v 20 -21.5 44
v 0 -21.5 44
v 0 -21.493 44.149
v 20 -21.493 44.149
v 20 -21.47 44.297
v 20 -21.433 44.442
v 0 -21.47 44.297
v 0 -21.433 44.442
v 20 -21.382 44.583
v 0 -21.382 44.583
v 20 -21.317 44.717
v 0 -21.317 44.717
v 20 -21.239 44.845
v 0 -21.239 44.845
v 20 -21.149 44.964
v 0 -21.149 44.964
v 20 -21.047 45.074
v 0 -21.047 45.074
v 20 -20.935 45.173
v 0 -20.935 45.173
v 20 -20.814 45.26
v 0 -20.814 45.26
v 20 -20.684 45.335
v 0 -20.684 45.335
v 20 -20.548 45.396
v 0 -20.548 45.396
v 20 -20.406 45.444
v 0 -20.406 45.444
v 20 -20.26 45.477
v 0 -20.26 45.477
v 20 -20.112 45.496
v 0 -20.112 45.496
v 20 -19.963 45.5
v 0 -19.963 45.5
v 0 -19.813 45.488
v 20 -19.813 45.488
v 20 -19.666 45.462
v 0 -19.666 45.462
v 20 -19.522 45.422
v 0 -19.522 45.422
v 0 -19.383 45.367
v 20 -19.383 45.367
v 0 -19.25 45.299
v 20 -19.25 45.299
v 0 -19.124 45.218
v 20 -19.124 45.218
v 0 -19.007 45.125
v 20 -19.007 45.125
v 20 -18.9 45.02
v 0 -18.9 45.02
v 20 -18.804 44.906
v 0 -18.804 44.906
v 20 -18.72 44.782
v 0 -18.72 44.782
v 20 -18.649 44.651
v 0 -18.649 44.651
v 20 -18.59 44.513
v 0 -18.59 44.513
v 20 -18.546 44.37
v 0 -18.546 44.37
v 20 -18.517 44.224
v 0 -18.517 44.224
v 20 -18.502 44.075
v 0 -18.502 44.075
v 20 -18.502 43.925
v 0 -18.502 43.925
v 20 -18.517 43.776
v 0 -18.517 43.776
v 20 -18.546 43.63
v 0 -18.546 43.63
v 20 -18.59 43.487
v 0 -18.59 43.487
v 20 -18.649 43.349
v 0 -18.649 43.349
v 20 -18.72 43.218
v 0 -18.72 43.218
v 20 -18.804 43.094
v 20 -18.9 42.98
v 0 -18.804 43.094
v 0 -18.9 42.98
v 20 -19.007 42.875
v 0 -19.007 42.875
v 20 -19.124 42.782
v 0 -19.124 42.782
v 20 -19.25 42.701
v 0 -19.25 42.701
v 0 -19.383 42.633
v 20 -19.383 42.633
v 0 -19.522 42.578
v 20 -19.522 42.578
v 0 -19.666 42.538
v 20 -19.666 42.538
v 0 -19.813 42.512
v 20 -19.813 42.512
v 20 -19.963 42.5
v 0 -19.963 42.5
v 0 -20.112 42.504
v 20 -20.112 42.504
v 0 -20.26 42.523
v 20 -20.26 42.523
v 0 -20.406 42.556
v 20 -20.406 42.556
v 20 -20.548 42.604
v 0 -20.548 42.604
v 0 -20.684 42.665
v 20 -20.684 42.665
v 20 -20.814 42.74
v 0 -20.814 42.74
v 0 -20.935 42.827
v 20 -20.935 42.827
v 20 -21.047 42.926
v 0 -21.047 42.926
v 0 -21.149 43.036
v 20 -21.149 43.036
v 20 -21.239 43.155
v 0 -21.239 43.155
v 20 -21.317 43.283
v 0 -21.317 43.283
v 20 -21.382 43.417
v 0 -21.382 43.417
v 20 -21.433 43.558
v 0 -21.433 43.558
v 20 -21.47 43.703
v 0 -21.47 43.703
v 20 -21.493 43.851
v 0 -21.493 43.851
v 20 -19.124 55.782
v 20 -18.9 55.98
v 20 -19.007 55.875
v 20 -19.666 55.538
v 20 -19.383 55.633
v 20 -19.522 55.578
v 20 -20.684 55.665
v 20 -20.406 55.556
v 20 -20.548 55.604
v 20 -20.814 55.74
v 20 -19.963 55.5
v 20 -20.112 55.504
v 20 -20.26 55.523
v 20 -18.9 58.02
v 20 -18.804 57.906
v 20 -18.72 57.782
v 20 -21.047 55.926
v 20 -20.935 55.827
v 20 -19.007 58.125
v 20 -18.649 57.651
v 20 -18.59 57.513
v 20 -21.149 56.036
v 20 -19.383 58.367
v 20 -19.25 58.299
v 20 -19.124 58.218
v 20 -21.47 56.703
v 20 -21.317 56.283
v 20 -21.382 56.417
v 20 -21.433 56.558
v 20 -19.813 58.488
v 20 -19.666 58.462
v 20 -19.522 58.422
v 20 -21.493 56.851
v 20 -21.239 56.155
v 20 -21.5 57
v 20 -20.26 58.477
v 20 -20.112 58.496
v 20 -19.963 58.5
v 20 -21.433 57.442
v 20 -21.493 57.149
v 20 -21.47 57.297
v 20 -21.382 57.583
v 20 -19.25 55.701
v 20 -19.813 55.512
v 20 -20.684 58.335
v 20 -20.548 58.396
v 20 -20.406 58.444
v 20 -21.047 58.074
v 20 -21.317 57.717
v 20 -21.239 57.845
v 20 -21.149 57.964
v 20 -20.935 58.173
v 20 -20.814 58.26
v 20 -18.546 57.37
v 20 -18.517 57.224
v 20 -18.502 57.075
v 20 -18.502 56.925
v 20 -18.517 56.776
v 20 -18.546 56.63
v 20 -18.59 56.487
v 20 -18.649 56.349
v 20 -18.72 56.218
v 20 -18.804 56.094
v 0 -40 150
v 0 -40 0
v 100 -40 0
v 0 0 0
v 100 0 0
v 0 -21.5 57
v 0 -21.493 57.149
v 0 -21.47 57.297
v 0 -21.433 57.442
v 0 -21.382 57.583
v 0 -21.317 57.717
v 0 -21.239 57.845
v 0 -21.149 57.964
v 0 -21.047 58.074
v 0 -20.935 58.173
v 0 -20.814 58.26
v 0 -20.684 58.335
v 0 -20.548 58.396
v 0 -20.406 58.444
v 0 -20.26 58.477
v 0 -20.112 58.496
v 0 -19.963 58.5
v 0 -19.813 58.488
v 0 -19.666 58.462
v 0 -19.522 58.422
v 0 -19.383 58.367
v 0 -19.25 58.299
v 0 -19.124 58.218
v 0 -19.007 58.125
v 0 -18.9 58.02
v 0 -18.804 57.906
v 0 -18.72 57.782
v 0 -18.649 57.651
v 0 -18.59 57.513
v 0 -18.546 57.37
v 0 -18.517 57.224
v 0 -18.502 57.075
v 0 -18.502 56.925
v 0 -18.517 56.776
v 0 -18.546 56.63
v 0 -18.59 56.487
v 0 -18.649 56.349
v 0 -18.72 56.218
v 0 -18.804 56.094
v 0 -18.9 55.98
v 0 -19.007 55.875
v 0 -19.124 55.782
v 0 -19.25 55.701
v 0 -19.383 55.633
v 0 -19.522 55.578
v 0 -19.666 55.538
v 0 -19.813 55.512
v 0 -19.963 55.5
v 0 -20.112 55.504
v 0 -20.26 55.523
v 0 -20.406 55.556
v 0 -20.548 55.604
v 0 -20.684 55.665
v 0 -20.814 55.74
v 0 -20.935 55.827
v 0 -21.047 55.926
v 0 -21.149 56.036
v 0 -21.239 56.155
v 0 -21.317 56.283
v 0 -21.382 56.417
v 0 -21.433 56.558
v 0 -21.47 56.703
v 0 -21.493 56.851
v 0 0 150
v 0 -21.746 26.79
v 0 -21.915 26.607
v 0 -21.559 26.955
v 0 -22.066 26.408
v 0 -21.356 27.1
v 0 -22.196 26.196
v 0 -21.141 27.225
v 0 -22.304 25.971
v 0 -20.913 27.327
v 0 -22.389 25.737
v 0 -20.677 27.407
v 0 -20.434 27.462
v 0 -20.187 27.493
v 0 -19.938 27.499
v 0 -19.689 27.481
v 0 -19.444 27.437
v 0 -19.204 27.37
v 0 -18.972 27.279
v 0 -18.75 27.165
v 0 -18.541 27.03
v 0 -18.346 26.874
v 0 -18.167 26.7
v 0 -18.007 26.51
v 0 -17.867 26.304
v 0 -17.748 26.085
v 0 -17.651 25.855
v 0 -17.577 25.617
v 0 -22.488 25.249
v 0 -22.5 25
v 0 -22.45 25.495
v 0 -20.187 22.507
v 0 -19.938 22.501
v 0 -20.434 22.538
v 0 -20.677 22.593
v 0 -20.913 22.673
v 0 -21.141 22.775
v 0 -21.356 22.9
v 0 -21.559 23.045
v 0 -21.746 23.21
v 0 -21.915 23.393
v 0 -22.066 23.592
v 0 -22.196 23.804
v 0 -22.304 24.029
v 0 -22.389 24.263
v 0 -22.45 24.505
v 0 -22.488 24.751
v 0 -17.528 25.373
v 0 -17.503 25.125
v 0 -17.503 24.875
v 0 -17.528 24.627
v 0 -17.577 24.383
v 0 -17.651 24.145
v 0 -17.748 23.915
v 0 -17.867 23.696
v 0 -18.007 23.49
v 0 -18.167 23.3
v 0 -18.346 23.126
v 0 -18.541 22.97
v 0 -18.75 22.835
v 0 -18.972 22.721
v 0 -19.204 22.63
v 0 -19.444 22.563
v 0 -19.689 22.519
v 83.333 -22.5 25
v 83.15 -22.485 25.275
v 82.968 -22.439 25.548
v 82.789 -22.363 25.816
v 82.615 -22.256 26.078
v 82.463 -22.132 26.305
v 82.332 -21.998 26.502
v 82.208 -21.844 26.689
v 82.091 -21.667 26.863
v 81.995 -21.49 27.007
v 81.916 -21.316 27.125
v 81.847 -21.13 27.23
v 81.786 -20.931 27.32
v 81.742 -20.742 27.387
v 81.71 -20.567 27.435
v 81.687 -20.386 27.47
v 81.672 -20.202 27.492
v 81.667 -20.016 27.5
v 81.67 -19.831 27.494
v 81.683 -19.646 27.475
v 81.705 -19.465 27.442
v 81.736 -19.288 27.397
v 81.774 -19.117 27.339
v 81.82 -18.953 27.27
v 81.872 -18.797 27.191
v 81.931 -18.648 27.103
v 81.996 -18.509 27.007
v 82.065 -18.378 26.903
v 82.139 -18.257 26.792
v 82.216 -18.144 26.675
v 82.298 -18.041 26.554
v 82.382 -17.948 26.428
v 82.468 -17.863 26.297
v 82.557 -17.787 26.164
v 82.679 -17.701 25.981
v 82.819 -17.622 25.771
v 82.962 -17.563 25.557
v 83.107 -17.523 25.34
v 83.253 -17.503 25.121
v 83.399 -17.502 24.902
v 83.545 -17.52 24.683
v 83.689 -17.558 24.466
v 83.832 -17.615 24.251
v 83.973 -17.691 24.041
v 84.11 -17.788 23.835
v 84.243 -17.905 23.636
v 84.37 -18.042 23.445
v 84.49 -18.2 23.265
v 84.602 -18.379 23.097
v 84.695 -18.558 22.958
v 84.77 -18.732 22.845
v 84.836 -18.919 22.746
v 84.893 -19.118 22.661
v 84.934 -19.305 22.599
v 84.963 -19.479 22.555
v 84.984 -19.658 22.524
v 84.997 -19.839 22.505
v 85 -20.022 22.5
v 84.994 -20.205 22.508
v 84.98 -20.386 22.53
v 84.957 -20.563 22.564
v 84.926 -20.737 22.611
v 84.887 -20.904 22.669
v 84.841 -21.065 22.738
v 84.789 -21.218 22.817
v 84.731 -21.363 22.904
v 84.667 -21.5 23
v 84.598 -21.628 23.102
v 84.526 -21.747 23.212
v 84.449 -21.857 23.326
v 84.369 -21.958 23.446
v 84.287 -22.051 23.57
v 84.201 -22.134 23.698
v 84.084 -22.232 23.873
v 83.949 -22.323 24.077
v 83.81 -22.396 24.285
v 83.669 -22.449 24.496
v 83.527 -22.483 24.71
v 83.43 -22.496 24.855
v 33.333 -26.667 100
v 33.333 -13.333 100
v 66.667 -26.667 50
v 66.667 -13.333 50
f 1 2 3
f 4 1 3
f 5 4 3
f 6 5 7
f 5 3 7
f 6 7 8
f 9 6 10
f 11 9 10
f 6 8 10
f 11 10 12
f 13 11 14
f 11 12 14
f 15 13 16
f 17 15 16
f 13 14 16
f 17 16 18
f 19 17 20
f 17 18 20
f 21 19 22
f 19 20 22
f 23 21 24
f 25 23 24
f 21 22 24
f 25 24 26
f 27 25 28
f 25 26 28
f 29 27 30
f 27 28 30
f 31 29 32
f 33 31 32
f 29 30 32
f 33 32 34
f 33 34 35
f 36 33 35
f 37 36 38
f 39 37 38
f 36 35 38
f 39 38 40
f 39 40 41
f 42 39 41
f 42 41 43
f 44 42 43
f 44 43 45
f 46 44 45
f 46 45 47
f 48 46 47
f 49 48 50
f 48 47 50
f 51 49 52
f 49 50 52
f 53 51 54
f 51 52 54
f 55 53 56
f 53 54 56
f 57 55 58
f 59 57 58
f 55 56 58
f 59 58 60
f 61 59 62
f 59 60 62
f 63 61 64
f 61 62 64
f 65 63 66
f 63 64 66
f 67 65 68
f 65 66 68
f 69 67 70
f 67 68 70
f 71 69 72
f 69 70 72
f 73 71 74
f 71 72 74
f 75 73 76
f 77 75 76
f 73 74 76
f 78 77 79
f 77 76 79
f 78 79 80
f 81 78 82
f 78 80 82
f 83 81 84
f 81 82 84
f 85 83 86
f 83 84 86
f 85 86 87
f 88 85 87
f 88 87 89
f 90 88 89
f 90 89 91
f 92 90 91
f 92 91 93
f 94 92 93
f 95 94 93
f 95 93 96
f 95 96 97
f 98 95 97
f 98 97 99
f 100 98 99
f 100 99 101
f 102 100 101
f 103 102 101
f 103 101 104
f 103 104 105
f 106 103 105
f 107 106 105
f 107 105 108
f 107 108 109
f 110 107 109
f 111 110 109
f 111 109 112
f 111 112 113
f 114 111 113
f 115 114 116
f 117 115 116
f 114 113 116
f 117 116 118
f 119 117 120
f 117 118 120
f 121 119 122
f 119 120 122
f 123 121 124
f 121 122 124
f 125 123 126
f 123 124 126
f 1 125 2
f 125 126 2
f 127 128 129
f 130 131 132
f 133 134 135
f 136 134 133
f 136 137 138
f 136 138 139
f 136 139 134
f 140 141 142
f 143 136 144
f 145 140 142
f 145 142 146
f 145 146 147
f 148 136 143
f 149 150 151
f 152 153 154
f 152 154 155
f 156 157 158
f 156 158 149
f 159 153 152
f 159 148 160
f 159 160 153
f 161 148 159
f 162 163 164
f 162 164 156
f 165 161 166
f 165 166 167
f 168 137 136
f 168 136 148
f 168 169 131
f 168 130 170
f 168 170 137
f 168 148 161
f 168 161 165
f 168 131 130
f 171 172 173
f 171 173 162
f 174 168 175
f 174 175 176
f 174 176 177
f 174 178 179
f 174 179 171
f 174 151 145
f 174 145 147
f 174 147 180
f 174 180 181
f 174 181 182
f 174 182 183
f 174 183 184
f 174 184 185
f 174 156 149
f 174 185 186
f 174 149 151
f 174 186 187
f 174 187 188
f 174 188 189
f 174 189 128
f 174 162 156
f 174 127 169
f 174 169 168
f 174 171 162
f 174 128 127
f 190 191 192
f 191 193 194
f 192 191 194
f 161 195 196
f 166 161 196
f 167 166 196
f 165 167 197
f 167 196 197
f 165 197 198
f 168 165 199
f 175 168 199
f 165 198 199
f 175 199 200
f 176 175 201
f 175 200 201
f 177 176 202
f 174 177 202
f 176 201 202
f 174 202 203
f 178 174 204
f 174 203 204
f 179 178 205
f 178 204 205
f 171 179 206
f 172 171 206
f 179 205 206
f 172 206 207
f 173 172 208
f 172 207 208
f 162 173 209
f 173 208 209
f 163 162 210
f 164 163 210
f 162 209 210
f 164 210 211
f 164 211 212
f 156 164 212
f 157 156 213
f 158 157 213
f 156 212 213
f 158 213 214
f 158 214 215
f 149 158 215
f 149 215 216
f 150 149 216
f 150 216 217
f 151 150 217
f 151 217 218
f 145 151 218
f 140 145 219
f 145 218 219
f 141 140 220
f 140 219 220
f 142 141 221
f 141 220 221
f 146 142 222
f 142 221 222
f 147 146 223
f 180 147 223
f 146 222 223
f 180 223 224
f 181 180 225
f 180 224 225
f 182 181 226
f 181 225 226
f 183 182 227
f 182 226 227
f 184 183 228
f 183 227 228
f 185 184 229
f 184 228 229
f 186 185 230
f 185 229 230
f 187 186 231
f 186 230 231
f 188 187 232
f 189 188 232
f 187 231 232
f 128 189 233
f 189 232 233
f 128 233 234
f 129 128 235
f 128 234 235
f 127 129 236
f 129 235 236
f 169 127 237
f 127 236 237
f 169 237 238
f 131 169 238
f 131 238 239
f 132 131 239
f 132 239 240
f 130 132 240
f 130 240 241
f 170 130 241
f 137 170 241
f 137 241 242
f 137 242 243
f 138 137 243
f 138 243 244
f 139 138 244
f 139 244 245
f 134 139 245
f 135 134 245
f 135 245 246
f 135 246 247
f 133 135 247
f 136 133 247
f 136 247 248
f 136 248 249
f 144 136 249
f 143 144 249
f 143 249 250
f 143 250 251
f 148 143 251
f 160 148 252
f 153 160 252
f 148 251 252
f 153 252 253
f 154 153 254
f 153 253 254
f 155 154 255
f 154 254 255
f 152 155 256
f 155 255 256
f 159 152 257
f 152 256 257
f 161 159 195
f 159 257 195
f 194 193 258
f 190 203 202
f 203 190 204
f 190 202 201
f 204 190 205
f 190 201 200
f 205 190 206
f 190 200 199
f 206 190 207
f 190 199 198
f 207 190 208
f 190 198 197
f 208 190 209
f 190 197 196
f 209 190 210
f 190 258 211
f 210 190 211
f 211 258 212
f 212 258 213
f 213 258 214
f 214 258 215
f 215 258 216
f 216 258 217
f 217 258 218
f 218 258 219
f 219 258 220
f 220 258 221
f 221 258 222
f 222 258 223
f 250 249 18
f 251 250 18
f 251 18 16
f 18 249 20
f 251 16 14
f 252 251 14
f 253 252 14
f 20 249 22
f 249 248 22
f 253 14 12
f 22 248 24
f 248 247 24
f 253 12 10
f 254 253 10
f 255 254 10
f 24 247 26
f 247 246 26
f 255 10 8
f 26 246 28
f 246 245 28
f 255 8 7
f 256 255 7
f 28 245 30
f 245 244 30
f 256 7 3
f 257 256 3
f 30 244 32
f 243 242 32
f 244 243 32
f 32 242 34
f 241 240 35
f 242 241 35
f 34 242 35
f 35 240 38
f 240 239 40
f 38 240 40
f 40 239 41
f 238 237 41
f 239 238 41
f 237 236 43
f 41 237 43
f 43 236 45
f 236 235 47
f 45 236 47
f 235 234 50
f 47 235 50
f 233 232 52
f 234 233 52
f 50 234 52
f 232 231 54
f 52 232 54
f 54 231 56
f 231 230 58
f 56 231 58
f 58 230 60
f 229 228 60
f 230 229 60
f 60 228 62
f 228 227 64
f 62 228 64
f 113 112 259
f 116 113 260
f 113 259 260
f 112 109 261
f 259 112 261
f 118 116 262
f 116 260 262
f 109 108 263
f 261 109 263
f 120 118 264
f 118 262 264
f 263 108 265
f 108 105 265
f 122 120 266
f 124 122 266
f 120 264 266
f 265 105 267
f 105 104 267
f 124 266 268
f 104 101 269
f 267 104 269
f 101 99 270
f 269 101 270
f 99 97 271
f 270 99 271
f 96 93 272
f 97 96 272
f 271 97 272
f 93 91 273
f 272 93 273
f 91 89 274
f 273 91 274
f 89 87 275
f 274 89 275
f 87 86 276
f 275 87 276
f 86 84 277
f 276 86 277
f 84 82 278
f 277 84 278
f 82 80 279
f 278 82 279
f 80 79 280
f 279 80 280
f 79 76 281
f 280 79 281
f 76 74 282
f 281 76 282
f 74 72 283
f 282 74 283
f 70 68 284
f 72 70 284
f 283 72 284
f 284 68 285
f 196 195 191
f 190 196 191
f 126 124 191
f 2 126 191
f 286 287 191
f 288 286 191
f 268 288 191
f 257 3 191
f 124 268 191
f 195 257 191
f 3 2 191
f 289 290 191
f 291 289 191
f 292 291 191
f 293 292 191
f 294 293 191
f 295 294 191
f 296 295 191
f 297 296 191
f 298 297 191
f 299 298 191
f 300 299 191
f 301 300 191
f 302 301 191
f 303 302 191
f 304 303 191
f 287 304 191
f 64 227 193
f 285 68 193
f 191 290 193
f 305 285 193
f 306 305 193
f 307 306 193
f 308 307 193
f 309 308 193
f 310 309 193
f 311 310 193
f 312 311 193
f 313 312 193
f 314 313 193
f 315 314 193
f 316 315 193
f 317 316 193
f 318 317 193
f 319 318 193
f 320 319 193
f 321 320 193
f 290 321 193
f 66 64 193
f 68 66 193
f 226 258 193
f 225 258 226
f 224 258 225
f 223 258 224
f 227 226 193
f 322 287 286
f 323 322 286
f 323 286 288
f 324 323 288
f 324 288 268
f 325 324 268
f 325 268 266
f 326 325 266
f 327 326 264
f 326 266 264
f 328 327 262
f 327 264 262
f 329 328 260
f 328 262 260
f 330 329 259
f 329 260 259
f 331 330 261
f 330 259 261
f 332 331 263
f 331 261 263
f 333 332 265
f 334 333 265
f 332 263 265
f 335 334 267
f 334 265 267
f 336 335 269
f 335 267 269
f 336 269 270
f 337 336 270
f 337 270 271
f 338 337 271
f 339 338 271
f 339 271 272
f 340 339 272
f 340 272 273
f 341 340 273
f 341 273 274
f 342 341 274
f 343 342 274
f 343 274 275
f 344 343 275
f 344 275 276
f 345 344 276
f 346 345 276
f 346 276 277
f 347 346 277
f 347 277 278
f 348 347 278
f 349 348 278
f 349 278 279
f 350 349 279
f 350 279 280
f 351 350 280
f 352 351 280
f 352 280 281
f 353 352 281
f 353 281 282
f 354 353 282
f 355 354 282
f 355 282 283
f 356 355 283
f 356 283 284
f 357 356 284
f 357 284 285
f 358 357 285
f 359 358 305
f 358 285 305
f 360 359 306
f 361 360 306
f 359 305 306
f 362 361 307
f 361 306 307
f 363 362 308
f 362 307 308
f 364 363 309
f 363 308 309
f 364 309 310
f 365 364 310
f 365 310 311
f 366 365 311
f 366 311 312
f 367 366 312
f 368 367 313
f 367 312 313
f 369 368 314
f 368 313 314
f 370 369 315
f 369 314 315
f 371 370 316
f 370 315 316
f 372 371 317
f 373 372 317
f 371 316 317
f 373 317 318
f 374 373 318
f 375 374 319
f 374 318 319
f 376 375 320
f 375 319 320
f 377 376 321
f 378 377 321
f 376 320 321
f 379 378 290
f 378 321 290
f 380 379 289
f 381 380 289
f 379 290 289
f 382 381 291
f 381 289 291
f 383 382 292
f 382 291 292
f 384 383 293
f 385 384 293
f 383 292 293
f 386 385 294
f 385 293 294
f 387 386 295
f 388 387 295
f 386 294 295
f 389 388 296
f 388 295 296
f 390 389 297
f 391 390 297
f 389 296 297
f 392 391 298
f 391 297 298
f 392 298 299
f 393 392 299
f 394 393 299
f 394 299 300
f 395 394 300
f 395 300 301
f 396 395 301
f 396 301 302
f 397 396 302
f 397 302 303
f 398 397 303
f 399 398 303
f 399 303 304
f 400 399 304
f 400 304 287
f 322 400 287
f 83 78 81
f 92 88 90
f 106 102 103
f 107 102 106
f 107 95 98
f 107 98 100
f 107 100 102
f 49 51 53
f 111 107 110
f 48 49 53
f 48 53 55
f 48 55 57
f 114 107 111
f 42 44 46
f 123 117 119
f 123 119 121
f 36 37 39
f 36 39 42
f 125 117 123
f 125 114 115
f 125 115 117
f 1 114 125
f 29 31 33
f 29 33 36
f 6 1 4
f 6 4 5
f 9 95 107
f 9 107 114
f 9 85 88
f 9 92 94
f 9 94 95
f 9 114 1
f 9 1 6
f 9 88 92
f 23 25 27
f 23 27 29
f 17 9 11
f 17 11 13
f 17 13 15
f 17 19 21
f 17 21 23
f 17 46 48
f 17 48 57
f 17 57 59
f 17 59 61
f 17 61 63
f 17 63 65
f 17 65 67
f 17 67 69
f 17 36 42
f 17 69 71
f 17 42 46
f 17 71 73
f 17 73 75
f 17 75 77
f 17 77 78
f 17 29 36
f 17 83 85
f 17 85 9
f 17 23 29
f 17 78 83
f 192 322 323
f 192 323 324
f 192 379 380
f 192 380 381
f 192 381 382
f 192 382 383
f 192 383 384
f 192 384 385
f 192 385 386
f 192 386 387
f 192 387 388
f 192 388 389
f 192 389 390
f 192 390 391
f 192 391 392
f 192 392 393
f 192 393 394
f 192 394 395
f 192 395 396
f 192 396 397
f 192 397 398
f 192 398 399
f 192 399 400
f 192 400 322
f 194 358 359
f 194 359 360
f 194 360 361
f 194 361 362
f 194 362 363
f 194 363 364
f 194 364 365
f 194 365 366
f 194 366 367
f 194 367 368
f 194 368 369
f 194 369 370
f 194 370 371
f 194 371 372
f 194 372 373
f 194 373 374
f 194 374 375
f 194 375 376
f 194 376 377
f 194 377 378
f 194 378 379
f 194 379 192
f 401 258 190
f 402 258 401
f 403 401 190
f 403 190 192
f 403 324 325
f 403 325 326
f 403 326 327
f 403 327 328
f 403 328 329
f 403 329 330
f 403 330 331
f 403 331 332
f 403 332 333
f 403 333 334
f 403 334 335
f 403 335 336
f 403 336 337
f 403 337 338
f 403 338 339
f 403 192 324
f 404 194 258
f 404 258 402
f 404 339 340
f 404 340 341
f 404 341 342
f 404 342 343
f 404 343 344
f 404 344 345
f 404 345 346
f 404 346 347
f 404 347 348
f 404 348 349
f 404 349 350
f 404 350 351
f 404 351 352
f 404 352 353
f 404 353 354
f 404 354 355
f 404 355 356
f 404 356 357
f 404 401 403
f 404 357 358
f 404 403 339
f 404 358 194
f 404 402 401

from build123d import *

# Parameters (mm, degrees)
F1_DEPTH = 40
F2_R     = 2.5
F3_DEPTH = 100.001
F4_R     = 1.5
F5_DEPTH = 20


with BuildPart() as f1:
    # F0 (on Front) → F1 (new body)
    with BuildSketch(Plane.XZ):
        with BuildLine():
            Line((0, 150), (0, 0))
            Line((0, 0), (100, 0))
            add(Edge.make_bspline(
                [(0, 150), (33.333333, 100), (66.666667, 50), (100, 0)],
                knots=[0, 0, 0, 0, 180.277564, 180.277564, 180.277564, 180.277564], degree=3))
        make_face()
    extrude(amount=F1_DEPTH)

    # F2 (on face) → F3 (cut, through all)
    with BuildSketch(Plane(origin=(0, 0, 0), x_dir=(0, -1, 0), z_dir=(-1, 0, 0))):
        with Locations((20, 25)):
            Circle(F2_R)
    extrude(amount=-F3_DEPTH, mode=Mode.SUBTRACT)

    # F4 (on face) → F5 (cut)
    with BuildSketch(Plane(origin=(0, 0, 0), x_dir=(0, -1, 0), z_dir=(-1, 0, 0))):
        with Locations((20, 57)):
            Circle(F4_R)
        with Locations((20, 44)):
            Circle(F4_R)
    extrude(amount=-F5_DEPTH, mode=Mode.SUBTRACT)


solid = f1.part
